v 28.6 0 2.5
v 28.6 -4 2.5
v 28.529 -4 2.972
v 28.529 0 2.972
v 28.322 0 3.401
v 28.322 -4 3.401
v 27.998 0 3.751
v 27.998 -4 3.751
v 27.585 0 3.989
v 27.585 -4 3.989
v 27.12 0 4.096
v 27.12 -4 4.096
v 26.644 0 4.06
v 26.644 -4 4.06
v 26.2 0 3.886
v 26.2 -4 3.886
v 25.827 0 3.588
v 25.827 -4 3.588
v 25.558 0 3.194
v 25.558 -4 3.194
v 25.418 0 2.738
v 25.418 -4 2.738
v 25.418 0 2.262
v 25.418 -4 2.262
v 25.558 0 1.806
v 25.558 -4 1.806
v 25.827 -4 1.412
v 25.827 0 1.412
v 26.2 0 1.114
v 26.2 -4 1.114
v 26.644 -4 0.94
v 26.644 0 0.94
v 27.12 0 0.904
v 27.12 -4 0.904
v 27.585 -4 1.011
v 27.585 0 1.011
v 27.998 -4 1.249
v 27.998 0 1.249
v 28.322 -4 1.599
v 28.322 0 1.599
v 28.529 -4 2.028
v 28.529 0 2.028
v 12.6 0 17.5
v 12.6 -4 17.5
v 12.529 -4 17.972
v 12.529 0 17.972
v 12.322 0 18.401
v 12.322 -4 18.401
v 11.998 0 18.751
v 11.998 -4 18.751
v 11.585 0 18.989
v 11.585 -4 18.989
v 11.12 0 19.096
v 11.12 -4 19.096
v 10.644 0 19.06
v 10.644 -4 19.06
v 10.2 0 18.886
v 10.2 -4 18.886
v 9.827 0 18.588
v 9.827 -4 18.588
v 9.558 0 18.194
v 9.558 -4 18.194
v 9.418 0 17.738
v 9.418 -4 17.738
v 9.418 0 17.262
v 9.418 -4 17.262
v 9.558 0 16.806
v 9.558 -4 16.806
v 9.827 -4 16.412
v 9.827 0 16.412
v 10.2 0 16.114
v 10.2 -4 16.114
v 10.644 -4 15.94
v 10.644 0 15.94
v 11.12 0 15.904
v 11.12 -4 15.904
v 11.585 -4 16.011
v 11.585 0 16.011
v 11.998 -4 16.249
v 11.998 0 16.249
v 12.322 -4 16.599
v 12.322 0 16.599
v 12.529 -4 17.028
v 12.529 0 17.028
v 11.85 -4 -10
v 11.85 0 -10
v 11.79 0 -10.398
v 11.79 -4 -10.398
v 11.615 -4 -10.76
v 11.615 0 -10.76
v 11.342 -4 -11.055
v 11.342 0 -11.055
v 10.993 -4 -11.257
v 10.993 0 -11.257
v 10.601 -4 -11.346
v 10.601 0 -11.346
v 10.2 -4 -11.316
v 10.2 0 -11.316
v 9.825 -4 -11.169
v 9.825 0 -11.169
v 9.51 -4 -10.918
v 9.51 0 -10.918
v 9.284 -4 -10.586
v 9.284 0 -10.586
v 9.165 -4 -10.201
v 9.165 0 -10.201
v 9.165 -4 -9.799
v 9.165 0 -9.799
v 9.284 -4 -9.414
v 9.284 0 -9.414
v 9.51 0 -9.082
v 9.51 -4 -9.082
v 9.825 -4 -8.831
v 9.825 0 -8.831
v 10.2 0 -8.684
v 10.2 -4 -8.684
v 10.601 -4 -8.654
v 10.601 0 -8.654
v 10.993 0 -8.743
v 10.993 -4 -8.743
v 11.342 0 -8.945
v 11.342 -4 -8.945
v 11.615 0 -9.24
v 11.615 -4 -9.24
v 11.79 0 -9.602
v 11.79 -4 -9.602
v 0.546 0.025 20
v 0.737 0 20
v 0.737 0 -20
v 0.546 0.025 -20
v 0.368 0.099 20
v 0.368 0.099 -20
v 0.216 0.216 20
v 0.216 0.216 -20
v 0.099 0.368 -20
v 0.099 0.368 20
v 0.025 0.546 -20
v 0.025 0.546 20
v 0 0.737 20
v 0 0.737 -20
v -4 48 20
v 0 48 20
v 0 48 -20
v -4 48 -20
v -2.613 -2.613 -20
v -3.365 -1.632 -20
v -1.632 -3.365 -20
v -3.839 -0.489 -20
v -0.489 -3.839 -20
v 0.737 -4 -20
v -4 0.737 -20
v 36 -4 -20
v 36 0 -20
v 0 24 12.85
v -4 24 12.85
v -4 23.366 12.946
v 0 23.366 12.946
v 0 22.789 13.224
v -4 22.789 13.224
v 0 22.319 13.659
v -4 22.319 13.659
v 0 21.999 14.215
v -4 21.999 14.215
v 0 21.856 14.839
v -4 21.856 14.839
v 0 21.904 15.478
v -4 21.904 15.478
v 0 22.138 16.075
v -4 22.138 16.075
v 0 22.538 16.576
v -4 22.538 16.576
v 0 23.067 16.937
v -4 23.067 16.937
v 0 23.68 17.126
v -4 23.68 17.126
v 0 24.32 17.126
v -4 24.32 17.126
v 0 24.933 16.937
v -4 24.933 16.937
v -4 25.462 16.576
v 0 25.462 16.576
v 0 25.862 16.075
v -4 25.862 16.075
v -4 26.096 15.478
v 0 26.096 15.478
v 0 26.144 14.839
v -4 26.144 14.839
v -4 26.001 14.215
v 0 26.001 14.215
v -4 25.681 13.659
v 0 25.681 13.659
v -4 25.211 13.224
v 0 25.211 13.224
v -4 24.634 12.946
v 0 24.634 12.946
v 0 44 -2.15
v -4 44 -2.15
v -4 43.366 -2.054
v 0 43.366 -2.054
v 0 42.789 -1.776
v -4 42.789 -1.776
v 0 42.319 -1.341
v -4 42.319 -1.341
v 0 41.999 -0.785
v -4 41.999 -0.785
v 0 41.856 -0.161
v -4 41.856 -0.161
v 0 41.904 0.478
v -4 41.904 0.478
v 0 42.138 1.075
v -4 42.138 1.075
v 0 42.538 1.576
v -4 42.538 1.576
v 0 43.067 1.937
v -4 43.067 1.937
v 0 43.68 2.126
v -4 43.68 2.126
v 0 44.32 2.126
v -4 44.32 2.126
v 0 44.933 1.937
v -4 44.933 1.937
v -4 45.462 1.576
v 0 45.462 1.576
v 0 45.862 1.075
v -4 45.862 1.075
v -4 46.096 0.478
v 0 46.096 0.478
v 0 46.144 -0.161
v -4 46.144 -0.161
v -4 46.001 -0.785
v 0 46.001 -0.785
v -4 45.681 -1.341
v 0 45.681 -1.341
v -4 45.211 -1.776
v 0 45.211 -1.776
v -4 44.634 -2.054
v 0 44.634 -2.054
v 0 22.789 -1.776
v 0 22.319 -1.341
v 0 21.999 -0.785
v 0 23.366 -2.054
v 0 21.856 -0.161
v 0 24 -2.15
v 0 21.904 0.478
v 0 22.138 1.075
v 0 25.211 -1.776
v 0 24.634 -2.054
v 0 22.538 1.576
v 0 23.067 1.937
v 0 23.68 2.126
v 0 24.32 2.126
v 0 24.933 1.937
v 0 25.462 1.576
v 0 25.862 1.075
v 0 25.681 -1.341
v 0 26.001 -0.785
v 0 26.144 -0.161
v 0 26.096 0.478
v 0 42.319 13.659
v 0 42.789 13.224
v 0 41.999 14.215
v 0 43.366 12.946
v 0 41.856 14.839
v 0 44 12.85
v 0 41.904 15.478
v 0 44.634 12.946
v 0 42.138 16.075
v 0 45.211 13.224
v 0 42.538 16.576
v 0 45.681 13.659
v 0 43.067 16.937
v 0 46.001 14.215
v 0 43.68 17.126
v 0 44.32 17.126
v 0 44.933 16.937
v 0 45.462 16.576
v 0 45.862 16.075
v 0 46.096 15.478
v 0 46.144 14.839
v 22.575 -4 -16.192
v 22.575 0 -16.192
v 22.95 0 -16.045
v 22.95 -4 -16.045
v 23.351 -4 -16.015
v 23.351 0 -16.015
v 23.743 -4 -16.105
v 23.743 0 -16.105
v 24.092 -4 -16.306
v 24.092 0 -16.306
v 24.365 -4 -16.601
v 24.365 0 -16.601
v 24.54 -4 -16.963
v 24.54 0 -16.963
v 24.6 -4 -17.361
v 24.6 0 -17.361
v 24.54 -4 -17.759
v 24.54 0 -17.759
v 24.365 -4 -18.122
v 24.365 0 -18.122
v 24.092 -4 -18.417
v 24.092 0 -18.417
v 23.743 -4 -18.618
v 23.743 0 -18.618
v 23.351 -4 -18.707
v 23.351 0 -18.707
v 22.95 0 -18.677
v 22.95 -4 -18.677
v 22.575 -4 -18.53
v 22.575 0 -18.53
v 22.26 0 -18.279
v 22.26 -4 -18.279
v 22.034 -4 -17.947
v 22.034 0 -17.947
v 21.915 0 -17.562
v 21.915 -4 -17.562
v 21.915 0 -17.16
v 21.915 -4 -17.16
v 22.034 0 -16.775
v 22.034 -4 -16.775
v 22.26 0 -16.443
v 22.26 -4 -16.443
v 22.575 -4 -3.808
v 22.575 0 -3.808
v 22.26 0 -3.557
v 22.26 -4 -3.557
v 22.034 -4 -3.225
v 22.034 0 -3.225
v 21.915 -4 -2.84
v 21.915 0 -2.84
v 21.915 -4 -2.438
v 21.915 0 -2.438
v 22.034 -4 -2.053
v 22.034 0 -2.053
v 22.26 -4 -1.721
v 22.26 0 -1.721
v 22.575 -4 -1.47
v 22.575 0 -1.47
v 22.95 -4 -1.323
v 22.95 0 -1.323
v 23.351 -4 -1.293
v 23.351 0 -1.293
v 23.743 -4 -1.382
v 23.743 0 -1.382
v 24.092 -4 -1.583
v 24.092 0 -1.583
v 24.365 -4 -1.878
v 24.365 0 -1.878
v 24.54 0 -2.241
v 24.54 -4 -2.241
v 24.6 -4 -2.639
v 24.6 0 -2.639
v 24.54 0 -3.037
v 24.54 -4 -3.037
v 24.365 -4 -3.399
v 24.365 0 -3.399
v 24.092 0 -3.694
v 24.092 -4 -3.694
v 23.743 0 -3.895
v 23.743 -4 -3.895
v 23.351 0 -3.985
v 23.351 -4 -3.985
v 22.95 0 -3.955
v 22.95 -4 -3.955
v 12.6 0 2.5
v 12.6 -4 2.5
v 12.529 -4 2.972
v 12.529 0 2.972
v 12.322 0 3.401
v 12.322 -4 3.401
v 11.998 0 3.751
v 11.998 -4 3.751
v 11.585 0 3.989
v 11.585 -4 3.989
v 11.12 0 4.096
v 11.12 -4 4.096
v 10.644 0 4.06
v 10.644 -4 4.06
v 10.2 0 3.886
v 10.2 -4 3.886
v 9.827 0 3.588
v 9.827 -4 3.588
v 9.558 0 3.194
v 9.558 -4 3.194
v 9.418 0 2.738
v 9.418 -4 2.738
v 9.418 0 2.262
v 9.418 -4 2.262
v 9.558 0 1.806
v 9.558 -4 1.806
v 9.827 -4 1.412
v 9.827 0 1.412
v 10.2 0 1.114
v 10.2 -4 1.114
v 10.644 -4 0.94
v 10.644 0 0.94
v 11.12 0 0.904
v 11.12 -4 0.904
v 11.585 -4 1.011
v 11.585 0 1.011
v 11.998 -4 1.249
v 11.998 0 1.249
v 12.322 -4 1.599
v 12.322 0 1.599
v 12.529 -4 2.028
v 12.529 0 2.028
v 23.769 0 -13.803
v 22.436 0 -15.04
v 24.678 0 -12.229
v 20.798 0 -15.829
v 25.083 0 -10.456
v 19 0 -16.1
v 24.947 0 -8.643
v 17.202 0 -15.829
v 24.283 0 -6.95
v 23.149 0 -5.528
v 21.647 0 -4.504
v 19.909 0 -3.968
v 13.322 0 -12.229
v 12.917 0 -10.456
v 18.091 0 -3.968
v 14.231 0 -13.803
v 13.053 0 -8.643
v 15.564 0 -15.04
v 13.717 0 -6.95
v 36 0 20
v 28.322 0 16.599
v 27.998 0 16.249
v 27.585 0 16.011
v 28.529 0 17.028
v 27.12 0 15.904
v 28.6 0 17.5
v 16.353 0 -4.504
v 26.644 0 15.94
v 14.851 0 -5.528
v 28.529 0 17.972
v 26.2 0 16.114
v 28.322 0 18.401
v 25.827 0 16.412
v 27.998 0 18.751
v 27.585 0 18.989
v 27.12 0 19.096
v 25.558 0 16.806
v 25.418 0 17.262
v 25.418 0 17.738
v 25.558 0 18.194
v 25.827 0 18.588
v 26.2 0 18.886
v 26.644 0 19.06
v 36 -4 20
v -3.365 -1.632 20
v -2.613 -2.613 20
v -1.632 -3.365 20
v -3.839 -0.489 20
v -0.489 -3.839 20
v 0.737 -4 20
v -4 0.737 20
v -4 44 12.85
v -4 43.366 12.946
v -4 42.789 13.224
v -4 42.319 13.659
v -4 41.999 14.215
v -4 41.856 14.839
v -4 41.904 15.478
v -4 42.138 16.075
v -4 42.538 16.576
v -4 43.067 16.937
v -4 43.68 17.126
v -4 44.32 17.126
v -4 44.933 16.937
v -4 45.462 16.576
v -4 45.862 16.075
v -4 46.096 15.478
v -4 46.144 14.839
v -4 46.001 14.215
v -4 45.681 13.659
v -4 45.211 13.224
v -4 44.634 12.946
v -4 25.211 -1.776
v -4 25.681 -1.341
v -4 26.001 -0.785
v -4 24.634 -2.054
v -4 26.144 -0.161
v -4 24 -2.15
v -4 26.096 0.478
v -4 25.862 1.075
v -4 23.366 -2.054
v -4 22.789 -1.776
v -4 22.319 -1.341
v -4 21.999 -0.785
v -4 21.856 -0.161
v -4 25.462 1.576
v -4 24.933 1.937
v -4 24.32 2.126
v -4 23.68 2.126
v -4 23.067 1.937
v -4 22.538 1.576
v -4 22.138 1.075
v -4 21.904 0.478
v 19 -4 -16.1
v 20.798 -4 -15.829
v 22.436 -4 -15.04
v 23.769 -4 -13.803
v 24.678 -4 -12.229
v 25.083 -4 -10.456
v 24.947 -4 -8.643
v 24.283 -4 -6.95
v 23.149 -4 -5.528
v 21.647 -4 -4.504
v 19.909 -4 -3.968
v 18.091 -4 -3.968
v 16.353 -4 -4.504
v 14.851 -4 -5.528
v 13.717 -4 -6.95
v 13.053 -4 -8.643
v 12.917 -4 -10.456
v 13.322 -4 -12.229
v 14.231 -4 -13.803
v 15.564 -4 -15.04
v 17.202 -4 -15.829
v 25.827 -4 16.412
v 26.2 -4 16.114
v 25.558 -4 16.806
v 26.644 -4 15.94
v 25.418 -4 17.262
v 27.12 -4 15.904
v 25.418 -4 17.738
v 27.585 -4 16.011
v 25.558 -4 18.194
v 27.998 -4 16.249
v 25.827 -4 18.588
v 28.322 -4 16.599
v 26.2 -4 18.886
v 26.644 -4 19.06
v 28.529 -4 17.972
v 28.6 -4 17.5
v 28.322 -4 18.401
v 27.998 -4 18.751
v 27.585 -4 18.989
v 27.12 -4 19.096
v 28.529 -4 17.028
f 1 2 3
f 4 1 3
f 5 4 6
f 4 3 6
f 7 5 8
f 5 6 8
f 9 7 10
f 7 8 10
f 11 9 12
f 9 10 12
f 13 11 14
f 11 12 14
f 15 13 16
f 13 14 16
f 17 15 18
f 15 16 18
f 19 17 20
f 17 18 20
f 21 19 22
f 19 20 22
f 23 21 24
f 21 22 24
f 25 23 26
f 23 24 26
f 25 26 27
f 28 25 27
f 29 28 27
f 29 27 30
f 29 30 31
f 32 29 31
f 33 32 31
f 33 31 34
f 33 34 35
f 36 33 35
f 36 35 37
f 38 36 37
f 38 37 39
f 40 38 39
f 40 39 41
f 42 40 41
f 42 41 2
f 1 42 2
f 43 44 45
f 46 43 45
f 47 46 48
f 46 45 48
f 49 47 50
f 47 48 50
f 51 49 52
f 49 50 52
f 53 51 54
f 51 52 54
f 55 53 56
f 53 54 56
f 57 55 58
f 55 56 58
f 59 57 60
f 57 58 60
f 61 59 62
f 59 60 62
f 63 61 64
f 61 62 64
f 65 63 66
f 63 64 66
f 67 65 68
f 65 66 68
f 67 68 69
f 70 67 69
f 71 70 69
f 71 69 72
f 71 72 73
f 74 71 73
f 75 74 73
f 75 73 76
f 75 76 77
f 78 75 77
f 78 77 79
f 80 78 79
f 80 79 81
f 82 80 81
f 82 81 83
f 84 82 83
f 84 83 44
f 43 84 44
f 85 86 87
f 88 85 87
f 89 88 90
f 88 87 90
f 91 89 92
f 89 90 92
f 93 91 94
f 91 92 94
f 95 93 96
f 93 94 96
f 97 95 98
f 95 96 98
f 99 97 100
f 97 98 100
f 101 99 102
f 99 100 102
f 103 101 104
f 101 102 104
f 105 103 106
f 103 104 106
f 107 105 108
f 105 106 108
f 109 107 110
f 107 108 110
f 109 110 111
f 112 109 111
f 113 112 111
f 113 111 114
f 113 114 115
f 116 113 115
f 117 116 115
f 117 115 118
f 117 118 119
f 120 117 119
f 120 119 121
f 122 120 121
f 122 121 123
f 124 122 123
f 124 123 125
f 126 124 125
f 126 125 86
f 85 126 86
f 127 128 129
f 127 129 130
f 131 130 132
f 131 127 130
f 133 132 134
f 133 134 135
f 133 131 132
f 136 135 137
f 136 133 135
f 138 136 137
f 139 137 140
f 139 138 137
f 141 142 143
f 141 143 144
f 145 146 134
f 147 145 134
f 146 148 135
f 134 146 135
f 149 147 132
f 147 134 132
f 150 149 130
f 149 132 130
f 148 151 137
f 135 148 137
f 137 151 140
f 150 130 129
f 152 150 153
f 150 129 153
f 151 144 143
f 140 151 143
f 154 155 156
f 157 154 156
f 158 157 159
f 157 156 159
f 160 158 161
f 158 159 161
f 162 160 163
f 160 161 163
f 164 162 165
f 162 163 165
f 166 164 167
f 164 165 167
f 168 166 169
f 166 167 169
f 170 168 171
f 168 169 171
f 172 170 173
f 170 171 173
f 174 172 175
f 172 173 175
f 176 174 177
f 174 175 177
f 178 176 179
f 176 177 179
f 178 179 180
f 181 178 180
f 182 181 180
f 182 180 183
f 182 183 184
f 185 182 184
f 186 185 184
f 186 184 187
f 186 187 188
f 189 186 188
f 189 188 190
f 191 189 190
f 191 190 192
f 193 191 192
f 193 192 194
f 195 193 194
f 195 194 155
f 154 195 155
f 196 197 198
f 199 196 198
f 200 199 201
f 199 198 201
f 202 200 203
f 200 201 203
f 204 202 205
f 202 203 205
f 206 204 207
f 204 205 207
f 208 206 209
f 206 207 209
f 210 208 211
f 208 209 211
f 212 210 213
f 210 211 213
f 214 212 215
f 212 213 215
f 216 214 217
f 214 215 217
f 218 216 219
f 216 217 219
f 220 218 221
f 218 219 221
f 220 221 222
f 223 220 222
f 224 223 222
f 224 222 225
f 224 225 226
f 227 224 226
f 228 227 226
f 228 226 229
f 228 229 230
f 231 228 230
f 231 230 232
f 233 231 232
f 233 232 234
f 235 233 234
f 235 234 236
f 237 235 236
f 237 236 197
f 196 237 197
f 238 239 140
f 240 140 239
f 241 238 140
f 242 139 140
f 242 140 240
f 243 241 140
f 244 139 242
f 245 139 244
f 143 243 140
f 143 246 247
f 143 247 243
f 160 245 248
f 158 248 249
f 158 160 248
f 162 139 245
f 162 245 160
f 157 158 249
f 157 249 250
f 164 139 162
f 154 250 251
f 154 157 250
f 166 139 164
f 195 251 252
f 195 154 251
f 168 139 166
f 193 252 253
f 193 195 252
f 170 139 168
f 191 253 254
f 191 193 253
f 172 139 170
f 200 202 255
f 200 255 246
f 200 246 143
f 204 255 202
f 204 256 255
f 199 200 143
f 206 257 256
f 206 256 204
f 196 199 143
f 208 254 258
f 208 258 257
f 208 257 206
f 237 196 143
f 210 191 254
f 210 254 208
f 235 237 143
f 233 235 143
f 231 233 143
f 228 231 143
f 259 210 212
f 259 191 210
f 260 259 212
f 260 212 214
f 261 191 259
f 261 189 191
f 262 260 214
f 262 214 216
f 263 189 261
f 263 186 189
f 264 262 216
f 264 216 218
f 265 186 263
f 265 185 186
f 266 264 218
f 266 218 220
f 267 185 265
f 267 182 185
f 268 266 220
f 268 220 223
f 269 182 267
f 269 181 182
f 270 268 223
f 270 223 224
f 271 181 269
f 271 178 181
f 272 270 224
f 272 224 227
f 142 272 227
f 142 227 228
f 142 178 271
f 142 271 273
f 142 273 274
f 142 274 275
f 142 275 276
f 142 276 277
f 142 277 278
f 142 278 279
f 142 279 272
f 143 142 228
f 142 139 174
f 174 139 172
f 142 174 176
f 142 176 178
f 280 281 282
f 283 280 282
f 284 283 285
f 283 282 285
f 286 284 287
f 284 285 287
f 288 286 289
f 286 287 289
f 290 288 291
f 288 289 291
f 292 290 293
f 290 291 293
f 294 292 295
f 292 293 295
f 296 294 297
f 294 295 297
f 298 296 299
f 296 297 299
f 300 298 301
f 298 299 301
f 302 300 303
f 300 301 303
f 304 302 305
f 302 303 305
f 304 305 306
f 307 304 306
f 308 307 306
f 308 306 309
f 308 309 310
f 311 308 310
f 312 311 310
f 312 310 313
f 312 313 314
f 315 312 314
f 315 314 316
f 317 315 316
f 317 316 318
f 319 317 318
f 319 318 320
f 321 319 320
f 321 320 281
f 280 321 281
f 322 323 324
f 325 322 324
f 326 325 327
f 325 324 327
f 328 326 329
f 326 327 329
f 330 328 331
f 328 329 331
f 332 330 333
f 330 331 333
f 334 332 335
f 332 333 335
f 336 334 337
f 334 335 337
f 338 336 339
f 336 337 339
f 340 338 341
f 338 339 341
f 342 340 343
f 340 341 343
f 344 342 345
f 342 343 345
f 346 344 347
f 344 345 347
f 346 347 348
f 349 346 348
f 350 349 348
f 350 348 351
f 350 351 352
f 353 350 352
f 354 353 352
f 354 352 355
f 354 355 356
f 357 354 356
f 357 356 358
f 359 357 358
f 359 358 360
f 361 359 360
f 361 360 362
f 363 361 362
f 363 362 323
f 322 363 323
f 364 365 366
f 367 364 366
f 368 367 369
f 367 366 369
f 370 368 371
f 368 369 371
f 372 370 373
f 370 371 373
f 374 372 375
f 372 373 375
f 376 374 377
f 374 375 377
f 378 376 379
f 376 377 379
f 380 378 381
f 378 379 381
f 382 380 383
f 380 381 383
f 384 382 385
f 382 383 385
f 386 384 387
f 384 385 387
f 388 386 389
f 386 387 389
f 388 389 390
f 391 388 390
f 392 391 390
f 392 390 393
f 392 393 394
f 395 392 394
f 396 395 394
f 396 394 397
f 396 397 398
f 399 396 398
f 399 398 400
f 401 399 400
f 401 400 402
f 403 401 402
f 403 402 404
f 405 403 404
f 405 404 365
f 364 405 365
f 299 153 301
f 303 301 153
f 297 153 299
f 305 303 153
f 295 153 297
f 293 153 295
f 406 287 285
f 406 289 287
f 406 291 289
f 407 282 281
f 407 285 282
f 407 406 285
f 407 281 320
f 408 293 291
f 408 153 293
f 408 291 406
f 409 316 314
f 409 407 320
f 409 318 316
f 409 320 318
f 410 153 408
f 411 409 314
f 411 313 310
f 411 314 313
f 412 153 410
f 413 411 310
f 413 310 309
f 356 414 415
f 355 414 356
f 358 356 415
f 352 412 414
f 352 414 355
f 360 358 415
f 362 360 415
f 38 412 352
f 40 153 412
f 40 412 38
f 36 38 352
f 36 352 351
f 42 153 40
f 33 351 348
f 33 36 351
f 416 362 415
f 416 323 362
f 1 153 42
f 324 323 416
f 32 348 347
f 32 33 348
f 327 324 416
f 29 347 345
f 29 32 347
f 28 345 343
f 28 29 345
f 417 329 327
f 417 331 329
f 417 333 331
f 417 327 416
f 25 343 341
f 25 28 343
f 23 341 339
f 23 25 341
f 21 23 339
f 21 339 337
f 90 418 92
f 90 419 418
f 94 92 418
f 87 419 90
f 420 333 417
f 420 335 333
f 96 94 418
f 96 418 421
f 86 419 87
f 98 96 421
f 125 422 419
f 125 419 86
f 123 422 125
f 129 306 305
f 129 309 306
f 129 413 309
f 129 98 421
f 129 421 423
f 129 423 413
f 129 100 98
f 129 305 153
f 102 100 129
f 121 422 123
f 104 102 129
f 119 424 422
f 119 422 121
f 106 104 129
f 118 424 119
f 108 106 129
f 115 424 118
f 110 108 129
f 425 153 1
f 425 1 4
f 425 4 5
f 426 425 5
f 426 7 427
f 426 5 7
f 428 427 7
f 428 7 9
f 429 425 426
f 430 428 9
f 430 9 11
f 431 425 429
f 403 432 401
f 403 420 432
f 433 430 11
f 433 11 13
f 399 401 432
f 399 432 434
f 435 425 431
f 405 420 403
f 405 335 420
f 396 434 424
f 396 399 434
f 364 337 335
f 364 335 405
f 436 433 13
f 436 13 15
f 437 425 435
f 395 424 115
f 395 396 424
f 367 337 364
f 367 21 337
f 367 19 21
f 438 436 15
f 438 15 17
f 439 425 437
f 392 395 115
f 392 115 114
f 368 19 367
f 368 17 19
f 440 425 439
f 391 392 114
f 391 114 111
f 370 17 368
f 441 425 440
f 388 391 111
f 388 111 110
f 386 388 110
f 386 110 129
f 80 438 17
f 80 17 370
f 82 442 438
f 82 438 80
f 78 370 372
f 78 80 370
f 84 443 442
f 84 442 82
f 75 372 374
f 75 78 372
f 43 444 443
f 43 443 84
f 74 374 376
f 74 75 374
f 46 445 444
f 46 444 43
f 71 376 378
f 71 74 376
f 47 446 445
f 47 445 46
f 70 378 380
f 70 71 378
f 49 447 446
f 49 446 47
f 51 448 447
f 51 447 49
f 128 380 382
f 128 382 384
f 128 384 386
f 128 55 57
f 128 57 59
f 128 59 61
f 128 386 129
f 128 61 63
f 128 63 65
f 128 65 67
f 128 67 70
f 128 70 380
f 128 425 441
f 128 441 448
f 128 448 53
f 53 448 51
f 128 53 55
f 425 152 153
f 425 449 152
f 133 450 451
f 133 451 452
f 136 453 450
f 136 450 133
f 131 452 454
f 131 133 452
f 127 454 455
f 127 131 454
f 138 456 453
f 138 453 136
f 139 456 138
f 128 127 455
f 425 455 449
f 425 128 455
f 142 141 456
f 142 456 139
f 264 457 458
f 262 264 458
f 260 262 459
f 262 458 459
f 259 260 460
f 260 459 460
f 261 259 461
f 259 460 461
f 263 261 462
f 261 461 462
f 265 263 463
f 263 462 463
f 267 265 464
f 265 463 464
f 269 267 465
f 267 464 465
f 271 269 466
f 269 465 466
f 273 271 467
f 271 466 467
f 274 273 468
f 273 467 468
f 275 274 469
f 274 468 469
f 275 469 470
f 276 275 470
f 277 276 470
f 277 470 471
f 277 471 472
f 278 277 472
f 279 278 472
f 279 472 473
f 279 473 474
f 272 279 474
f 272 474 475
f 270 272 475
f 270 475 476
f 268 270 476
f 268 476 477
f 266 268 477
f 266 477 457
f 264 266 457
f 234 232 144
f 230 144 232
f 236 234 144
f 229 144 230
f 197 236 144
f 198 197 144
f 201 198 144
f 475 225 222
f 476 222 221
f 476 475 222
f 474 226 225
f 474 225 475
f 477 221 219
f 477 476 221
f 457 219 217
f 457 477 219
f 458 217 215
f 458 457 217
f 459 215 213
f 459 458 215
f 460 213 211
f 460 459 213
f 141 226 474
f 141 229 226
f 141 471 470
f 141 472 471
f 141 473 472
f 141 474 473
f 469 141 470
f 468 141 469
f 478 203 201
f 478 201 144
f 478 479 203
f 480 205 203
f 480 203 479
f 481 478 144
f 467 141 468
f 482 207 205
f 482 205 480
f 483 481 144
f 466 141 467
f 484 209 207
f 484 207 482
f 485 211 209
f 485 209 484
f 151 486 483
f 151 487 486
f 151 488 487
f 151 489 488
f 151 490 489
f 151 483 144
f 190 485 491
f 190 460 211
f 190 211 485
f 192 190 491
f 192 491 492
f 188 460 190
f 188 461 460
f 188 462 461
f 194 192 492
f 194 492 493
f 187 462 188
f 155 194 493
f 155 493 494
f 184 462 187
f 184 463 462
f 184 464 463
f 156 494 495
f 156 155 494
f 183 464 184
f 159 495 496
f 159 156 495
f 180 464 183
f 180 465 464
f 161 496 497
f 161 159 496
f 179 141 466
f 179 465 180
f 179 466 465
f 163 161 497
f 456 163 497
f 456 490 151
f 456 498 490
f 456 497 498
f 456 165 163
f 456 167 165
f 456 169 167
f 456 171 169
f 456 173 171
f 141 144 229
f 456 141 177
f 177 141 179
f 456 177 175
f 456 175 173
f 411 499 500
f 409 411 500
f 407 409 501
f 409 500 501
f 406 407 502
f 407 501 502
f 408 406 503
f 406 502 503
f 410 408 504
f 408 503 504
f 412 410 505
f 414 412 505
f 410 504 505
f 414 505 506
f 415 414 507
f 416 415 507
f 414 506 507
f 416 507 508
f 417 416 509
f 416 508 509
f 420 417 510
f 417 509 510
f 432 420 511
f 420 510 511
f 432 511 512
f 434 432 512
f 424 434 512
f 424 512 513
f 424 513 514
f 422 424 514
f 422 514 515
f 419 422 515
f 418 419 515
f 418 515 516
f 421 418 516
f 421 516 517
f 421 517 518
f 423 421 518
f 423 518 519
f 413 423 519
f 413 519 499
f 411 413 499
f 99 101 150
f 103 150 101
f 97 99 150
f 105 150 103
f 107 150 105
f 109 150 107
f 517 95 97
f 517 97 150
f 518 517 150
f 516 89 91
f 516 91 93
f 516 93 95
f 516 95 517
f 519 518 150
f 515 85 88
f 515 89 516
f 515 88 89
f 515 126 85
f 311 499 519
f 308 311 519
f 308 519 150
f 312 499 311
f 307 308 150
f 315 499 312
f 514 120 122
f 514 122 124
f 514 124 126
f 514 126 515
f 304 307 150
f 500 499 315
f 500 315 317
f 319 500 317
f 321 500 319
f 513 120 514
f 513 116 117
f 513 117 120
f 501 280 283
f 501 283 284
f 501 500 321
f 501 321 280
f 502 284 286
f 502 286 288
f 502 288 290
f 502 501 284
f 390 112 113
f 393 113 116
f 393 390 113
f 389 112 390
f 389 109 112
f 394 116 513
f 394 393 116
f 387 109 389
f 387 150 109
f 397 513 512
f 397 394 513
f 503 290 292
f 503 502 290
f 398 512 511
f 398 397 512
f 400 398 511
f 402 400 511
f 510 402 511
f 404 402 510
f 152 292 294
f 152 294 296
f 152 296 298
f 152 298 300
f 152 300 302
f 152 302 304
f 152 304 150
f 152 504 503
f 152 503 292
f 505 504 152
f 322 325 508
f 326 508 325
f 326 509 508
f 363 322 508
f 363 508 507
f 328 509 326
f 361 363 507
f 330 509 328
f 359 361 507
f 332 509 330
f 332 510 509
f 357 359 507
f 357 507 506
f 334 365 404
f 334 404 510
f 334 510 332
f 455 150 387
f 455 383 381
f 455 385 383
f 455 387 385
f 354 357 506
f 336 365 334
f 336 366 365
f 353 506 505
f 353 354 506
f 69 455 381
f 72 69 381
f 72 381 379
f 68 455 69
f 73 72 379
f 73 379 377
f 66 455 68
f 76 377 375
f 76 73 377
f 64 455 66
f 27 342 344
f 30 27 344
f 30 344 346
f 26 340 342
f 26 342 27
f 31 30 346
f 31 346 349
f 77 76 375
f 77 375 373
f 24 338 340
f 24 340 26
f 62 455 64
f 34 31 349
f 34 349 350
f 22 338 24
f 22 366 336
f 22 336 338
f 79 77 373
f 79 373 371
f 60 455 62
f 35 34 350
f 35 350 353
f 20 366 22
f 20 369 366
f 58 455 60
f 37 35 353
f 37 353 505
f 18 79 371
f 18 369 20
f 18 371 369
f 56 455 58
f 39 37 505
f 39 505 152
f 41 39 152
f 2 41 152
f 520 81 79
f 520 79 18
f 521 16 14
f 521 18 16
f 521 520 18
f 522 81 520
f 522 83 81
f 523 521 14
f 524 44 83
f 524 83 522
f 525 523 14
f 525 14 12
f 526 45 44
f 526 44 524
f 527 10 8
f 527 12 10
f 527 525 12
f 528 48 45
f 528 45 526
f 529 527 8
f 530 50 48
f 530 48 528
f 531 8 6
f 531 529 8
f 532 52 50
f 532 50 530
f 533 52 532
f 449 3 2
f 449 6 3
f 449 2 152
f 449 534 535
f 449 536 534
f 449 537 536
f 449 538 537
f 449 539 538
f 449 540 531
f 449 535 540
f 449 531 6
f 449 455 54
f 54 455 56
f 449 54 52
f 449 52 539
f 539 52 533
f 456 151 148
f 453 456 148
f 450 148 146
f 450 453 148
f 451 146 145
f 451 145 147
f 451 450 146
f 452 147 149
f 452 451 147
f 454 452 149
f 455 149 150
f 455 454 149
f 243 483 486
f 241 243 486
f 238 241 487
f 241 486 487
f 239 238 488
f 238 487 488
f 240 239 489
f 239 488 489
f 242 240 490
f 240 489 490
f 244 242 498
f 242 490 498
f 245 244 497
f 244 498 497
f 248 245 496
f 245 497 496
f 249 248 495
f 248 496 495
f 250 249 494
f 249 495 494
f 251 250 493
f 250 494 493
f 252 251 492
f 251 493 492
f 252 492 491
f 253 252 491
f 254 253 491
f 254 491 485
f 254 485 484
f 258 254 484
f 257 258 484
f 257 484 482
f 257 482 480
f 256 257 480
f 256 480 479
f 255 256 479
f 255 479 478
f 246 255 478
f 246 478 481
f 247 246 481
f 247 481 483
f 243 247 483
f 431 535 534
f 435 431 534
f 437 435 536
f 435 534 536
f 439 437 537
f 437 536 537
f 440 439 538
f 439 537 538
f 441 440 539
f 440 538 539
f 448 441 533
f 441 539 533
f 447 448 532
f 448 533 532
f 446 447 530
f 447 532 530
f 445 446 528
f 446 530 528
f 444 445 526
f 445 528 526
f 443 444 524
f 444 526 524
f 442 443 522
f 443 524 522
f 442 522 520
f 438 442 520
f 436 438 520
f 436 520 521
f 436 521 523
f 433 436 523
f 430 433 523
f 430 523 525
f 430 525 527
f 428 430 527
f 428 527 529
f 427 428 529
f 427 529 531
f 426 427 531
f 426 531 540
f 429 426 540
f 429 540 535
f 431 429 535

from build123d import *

# Parameters (mm, degrees)
SM_BASE_FLANGE_2_DEPTH   = 20
HOLE_WIZARD_M3_1_D       = 3.2
SKETCH_24_R              = 6.1
CUT_EXTRUDE_2_DEPTH      = 67.332495807
HOLE_WIZARD_M4_1_D       = 4.3
HOLE_WIZARD_M2_5_1_D     = 2.7
PATTERN_CIRCULAR_1_COUNT = 3


# Sheet-metal steps are written as plain solids
with BuildPart() as part:
    # 草圖16 → 基材-凸緣2 (new, symmetric)
    with BuildSketch(Plane.XY):
        with BuildLine():
            Line((36, 0), (0.7366, 0))
            ThreePointArc((0.7366, 0), (0.215745145, 0.215745145), (0, 0.7366))
            Line((0, 0.7366), (0, 48))
            Line((0, 48), (-4, 48))
            Line((-4, 48), (-4, 0.7366))
            ThreePointArc((-4, 0.7366), (-2.61268198, -2.61268198), (0.7366, -4))
            Line((0.7366, -4), (36, -4))
            Line((36, -4), (36, 0))
        make_face()
    extrude(amount=SM_BASE_FLANGE_2_DEPTH, both=True)

    # M3 餘隙孔1 (through all)
    with Locations(Plane(origin=(0, 0, 0), x_dir=(-1, 0, 0), z_dir=(0, 1, 0))):
        with Locations((-27, 17.5), (-11, 2.5), (-11, 17.5), (-27, 2.5)):
            Hole(HOLE_WIZARD_M3_1_D / 2)

    # 草圖24 → 除料-伸長2 (cut, through all)
    with BuildSketch(Plane.XZ.offset(4)):
        with Locations(Location((19, -10, 0), (0, 0, 270))):
            Circle(SKETCH_24_R)
    extrude(amount=-CUT_EXTRUDE_2_DEPTH, mode=Mode.SUBTRACT)

    # M4 餘隙孔1 (through all)
    with Locations(Plane(origin=(0, 0, 0), x_dir=(0, 0, 1), z_dir=(1, 0, 0))):
        with Locations((0, -44), (15, -44), (15, -24), (0, -24)):
            Hole(HOLE_WIZARD_M4_1_D / 2)

    # M2.5 餘隙孔1 (through all)
    with Locations(Plane(origin=(0, -4, 0), x_dir=(-1, 0, 0), z_dir=(0, -1, 0))):
        with Locations((-10.5, 10)):
            hole_wizard_m2_5_1 = Hole(HOLE_WIZARD_M2_5_1_D / 2)

    # 環狀複製排列1: M2.5 餘隙孔1 ×3 about axis
    pattern_circular_1_axis = Axis((19, 0, -10), (0, 1, 0))
    for i in range(1, PATTERN_CIRCULAR_1_COUNT):
        add(hole_wizard_m2_5_1.rotate(pattern_circular_1_axis, i * 360 / PATTERN_CIRCULAR_1_COUNT), mode=Mode.SUBTRACT)


solid = part.part
